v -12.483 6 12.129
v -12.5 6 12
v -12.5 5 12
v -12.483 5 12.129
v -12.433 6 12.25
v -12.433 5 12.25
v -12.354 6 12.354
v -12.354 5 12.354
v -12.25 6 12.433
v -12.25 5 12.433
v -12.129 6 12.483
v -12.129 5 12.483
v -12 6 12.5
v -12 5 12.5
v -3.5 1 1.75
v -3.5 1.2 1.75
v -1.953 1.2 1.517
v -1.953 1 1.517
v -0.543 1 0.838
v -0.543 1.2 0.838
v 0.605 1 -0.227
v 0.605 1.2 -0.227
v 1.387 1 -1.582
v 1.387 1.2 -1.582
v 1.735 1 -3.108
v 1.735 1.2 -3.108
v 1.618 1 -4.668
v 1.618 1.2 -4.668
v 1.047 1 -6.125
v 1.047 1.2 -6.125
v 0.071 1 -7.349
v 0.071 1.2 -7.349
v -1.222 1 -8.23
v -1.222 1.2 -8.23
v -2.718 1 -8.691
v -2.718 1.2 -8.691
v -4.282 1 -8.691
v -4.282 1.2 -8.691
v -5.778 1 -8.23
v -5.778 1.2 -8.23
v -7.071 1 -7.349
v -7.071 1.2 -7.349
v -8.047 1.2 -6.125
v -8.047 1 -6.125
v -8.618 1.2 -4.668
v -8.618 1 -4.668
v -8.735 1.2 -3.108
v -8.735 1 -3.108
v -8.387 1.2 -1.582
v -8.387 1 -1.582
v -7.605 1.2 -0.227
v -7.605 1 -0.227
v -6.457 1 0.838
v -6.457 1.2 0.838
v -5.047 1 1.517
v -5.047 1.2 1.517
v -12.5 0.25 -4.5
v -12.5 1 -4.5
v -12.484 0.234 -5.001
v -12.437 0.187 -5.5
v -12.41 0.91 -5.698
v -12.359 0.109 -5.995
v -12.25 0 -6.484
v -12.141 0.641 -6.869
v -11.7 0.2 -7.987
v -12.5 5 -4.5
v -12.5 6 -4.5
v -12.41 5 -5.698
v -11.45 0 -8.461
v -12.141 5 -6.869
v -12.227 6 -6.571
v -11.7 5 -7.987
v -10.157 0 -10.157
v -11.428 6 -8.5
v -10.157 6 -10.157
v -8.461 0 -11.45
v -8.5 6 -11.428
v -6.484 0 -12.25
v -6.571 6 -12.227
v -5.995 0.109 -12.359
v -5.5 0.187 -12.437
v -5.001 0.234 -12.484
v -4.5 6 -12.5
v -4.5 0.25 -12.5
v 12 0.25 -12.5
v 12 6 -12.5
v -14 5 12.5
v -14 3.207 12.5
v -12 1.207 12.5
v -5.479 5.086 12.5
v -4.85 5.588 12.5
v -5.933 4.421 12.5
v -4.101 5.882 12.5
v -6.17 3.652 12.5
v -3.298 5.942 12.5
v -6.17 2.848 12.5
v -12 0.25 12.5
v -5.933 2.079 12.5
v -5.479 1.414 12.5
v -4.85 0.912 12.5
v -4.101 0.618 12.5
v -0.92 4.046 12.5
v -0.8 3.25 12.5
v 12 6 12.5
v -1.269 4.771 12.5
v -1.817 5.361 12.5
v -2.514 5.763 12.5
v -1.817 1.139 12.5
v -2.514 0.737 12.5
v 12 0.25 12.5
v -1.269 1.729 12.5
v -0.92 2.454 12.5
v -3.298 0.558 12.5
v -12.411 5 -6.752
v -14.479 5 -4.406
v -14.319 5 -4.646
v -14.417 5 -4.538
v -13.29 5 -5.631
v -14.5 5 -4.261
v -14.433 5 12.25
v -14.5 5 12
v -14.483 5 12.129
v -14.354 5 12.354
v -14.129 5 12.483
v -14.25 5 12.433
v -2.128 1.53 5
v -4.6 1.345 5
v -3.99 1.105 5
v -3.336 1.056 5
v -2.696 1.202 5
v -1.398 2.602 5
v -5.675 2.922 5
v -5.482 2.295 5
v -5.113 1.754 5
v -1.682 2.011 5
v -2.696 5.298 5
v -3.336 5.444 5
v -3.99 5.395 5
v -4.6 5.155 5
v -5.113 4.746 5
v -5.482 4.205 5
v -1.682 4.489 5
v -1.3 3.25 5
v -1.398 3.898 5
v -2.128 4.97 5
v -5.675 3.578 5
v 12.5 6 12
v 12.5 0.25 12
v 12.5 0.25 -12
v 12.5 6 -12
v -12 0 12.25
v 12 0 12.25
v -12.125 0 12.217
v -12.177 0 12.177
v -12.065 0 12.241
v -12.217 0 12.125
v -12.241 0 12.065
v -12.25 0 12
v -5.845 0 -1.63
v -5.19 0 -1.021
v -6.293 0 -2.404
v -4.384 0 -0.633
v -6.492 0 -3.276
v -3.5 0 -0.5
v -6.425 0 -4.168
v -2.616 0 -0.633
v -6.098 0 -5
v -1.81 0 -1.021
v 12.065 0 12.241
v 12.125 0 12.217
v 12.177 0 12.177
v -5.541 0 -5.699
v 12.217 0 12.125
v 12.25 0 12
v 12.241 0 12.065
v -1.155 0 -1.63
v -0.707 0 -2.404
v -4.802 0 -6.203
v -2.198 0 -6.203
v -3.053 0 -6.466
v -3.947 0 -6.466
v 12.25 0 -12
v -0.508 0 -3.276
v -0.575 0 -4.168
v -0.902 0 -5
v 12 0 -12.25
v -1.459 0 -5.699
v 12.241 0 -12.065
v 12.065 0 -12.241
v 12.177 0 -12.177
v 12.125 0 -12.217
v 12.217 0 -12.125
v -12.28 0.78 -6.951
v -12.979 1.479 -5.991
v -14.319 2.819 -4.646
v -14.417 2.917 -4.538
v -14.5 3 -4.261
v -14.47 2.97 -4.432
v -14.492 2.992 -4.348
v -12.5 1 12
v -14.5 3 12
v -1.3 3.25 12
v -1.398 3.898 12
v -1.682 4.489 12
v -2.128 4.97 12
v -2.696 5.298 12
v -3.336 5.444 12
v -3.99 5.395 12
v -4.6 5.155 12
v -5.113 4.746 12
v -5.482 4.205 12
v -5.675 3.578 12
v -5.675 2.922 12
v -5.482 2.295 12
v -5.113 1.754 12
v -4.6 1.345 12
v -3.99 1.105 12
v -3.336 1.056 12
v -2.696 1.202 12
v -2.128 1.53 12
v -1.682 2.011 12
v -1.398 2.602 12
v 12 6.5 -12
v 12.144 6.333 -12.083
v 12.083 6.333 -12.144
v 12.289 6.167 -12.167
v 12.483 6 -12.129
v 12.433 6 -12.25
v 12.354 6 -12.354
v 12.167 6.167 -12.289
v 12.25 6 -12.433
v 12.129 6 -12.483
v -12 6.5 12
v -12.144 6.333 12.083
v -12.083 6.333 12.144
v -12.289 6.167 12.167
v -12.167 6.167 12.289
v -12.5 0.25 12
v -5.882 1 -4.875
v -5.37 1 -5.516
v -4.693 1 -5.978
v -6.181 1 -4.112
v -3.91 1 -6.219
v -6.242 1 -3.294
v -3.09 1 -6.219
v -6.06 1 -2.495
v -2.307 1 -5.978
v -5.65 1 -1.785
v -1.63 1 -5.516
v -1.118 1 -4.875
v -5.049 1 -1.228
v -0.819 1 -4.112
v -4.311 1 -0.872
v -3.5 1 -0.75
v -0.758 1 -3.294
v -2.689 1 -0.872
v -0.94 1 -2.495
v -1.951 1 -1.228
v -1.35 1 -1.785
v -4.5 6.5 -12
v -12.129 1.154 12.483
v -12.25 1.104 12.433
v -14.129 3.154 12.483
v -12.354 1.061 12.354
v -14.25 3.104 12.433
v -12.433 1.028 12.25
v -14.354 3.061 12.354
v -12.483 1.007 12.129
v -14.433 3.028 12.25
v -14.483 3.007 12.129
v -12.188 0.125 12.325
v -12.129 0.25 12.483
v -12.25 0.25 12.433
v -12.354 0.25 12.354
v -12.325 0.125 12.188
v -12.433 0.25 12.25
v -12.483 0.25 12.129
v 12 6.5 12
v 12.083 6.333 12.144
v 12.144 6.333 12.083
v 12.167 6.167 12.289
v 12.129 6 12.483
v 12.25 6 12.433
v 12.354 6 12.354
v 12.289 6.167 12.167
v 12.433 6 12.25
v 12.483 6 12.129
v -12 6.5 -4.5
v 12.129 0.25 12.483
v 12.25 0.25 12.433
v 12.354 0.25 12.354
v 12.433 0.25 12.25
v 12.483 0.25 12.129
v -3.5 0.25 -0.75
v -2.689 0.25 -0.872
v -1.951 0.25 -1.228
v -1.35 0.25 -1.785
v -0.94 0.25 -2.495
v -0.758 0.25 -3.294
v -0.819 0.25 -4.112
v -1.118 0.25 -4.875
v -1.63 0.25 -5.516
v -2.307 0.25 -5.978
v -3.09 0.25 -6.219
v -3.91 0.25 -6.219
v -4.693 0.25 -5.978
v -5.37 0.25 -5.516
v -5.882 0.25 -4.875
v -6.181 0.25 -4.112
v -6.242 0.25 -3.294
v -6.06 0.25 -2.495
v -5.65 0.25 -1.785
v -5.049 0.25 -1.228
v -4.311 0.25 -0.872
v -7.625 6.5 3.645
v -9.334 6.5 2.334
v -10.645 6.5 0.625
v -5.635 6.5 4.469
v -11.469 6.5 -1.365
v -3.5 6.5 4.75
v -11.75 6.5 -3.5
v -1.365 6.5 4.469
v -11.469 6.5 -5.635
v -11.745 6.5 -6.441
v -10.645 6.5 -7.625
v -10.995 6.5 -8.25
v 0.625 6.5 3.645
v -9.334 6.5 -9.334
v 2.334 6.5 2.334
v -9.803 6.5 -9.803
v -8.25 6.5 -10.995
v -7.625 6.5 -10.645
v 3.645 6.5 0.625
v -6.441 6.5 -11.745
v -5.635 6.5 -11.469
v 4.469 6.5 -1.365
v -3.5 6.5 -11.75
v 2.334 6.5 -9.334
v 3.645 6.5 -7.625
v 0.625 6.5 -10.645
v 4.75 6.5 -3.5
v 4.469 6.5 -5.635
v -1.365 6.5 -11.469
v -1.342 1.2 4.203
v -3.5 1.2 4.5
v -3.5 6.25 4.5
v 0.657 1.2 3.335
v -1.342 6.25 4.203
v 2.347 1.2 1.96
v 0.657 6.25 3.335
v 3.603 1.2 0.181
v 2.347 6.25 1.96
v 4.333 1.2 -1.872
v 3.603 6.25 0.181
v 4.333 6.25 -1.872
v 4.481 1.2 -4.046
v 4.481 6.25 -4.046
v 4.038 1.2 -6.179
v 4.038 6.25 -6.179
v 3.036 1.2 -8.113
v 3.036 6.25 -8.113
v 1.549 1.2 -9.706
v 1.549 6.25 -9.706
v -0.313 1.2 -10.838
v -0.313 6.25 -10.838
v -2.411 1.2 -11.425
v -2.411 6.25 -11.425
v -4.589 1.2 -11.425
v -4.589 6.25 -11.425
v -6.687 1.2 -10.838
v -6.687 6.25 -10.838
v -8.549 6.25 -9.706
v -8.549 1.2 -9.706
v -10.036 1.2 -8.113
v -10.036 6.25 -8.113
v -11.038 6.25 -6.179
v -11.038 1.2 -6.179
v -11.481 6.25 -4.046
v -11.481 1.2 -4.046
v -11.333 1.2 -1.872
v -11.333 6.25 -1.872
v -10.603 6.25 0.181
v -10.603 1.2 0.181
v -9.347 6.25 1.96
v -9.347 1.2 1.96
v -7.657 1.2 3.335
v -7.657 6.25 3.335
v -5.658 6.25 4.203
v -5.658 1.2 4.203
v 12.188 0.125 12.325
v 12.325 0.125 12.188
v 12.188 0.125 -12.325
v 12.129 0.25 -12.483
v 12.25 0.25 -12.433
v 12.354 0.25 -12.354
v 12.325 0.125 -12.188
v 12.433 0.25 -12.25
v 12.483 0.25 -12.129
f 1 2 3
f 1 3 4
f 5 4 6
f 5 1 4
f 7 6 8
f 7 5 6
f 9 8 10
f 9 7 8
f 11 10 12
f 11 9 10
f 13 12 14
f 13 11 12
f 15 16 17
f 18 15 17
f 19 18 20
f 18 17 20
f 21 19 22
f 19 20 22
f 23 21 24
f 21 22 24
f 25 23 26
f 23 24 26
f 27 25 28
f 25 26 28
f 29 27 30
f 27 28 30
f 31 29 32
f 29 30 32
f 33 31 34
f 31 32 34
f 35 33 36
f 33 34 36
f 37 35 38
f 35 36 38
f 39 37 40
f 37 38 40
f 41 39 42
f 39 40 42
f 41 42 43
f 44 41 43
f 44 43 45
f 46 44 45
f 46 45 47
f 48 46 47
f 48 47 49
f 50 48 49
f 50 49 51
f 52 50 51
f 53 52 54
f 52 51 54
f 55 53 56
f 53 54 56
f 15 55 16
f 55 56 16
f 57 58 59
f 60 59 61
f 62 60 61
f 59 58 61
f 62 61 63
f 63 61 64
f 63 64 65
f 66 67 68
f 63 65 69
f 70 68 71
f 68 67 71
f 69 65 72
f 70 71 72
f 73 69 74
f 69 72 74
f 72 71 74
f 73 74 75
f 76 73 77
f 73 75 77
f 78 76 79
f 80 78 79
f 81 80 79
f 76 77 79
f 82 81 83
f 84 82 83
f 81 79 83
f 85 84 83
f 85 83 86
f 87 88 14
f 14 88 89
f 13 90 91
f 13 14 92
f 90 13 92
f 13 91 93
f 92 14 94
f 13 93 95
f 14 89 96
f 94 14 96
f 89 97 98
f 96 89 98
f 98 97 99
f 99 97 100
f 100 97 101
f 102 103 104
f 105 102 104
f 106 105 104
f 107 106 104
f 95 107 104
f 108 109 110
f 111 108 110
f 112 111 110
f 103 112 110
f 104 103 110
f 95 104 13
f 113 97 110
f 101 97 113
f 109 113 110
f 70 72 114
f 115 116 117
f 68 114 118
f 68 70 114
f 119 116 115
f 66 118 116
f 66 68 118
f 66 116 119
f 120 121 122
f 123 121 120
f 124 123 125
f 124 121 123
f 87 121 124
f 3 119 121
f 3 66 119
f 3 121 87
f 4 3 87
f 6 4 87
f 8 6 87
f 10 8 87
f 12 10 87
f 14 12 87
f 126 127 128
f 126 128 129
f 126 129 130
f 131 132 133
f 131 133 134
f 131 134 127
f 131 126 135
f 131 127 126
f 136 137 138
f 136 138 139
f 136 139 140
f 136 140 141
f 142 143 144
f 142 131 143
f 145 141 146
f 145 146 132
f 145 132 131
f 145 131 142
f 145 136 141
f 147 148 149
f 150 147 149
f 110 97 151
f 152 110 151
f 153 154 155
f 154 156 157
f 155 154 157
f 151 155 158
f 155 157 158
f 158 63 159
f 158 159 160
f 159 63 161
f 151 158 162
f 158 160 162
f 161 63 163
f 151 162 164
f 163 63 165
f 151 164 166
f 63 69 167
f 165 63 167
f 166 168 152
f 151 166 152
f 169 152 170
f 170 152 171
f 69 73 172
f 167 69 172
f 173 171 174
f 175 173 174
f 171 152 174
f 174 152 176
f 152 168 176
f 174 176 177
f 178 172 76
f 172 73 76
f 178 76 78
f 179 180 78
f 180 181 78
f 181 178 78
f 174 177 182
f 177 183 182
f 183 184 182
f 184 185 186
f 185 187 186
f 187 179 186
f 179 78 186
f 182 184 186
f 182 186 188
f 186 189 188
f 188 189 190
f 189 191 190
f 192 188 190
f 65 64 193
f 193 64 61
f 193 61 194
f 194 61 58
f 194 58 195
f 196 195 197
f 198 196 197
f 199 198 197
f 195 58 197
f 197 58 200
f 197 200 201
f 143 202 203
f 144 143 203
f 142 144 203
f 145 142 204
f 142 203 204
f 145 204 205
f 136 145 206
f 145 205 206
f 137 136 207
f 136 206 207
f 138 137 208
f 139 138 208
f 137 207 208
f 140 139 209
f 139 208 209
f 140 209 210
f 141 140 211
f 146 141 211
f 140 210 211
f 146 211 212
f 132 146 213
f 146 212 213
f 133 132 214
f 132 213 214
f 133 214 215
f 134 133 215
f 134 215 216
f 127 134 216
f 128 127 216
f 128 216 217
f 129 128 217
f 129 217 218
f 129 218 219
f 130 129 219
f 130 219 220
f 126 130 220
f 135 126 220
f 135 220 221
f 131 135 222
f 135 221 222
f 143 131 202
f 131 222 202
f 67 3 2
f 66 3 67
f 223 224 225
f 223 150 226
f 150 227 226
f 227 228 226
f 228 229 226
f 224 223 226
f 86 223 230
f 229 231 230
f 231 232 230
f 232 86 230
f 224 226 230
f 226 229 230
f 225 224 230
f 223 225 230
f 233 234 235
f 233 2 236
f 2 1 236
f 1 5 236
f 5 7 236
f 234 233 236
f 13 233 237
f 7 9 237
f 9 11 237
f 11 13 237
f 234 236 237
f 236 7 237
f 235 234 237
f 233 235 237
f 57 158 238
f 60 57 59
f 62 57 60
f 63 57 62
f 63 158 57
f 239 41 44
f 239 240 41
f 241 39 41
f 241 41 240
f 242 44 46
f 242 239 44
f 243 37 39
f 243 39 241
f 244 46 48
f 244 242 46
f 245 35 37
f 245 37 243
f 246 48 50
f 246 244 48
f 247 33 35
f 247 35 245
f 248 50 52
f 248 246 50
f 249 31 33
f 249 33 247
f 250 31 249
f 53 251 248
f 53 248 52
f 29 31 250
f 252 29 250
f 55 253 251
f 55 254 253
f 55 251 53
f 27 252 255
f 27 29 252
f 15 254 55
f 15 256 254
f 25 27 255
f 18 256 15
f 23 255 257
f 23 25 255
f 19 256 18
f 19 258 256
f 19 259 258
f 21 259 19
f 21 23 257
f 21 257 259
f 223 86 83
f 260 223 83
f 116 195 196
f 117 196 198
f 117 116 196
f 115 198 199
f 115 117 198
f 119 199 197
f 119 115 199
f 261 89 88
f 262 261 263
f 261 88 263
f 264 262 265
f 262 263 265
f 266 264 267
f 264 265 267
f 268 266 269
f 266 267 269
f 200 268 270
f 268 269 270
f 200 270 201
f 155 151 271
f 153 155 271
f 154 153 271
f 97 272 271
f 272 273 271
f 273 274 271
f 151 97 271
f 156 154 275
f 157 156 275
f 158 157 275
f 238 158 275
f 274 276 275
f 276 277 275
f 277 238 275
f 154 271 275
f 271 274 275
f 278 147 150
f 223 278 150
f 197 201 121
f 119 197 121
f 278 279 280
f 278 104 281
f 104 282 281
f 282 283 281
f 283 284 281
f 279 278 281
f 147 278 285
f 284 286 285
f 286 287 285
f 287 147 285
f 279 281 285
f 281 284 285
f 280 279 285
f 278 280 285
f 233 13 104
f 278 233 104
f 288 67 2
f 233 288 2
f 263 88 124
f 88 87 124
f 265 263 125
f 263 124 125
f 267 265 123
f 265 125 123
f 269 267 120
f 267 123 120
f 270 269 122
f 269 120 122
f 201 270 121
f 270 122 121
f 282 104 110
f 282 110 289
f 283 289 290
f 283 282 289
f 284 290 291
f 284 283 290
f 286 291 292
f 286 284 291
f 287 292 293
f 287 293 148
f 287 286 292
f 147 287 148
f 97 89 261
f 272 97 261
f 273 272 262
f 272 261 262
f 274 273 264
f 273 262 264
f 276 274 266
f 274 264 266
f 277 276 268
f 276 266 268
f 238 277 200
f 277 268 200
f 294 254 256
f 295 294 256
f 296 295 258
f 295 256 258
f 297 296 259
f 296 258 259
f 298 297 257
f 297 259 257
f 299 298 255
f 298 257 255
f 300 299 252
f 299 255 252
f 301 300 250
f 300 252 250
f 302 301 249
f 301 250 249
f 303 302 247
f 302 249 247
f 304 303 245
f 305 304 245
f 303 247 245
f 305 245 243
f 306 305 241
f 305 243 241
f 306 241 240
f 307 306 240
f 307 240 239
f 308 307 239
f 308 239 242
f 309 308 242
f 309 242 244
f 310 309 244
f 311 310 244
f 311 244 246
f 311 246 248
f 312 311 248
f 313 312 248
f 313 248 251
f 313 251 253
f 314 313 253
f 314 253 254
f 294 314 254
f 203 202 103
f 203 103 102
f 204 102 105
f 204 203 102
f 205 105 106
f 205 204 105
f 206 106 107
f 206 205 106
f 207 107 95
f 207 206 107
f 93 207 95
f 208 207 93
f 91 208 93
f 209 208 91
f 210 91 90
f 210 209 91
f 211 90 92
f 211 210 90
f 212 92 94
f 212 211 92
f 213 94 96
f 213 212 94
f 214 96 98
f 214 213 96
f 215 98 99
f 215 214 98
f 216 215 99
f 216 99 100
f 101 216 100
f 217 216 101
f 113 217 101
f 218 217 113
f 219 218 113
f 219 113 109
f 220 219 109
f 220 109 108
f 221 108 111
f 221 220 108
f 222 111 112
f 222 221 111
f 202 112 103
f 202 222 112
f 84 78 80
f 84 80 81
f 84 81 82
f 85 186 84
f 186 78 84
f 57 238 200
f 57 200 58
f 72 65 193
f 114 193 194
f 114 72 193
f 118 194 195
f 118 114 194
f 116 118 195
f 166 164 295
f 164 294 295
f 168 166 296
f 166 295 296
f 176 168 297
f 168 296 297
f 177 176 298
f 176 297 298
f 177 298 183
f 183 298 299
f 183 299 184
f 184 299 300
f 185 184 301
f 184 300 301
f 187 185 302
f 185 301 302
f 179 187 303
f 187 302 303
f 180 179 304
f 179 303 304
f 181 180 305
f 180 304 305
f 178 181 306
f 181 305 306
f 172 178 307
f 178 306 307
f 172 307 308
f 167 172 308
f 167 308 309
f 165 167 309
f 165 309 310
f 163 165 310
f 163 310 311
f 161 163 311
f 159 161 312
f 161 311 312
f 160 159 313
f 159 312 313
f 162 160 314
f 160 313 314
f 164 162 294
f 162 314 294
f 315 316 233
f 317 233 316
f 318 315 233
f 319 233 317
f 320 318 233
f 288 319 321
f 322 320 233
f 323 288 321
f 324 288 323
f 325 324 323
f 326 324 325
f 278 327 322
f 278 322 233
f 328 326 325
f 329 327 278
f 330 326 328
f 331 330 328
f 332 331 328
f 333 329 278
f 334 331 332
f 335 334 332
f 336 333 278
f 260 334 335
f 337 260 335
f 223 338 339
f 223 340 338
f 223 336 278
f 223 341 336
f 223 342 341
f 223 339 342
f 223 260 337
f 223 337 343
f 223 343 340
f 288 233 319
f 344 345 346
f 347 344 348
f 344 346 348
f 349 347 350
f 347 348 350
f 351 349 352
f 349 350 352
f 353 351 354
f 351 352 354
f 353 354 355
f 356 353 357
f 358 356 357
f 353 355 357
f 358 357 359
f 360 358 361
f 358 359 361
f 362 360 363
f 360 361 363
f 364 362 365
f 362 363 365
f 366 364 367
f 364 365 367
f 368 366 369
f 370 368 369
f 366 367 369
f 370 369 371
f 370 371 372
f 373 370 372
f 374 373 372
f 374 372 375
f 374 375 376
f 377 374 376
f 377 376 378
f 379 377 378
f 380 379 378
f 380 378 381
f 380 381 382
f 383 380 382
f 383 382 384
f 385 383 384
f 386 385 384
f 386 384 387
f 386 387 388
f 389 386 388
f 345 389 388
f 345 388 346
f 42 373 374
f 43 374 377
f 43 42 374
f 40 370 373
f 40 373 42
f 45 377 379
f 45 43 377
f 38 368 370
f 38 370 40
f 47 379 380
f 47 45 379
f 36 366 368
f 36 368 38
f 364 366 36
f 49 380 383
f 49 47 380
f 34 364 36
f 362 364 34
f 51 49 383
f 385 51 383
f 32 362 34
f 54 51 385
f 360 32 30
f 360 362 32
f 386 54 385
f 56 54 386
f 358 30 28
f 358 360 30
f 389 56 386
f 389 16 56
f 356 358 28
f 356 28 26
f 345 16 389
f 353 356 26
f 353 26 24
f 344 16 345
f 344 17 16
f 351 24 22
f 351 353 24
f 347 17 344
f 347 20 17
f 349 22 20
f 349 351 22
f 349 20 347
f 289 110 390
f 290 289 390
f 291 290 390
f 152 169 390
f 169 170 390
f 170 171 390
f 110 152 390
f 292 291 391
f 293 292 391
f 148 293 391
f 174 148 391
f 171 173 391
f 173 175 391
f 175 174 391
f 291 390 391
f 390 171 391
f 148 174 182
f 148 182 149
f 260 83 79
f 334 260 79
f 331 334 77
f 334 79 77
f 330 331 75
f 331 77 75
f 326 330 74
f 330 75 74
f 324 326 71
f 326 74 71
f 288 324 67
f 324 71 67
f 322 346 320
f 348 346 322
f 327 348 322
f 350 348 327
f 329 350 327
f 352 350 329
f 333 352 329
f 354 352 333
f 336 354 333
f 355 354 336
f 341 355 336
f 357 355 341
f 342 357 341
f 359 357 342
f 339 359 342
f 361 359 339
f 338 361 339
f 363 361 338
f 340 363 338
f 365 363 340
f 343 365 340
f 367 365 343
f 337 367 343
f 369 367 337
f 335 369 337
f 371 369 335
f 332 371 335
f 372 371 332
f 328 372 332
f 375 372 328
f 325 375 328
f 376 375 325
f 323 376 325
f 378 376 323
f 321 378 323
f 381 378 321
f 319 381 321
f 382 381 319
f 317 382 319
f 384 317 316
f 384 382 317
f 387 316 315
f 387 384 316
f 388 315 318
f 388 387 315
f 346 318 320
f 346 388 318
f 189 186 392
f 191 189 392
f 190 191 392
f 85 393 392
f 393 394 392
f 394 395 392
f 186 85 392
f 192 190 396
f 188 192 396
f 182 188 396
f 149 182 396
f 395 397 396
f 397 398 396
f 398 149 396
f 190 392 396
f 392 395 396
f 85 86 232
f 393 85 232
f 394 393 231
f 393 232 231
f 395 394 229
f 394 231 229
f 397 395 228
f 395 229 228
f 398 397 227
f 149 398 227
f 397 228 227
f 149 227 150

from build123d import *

# Parameters (mm, degrees)
SKETCH1_W           = 25
SKETCH1_H           = 25
BOSS_EXTRUDE1_DEPTH = 6.5
SKETCH2_R           = 8
CUT_EXTRUDE1_DEPTH  = 5.5
FILLET1_R           = 8
SKETCH4_R           = 2.2
CUT_EXTRUDE2_DEPTH  = 7.5
BOSS_EXTRUDE2_DEPTH = 17
FILLET2_R           = 10
SKETCH6_R           = 2.75
CUT_EXTRUDE3_DEPTH  = 20.918584287
BOSS_EXTRUDE3_START = 0.2
SKETCH7_R           = 8
SKETCH7_R_2         = 5.25
BOSS_EXTRUDE3_DEPTH = 0.2
FILLET3_R           = 0.5
CHAMFER1_SIZE       = 0.5
CHAMFER7_SIZE       = 0.25


# Some blends are built 0.0001 mm under size
with BuildPart() as part:
    # Sketch1 → Boss-Extrude1 (new body)
    with BuildSketch(Plane(origin=(0, 0, 0), x_dir=(1, 0, 0), z_dir=(0, 1, 0))):
        Rectangle(SKETCH1_W, SKETCH1_H)
    extrude(amount=BOSS_EXTRUDE1_DEPTH)

    # Sketch2 → Cut-Extrude1 (cut)
    with BuildSketch(Plane(origin=(0, 6.5, 0), x_dir=(1, 0, 0), z_dir=(0, 1, 0))):
        with Locations(Location((-3.5, 3.5, 0), (0, 0, 270))):
            Circle(SKETCH2_R)
    extrude(amount=-CUT_EXTRUDE1_DEPTH, mode=Mode.SUBTRACT)

    # Fillet1
    fillet1_edges = [part.edges().sort_by_distance(p)[0] for p in [
        (-12.5, 3.25, -12.5),
    ]]
    fillet(fillet1_edges, radius=FILLET1_R)

    # Sketch4 → Cut-Extrude2 (cut)
    with BuildSketch(Plane.XY.offset(12.5)):
        with Locations((-3.5, 3.25)):
            Circle(SKETCH4_R)
    extrude(amount=-CUT_EXTRUDE2_DEPTH, mode=Mode.SUBTRACT)

    # Sketch5 → Boss-Extrude2 (add)
    with BuildSketch(Plane.XY.offset(12.5)):
        Polygon((-12.5, 1), (-14.5, 3), (-14.5, 5), (-12.5, 5), align=None)
    extrude(amount=-BOSS_EXTRUDE2_DEPTH)

    # Fillet2
    # the kernel refuses this fillet: 10 mm, written as the material it adds along each edge
    with BuildSketch(Plane(origin=(-12.5, 5, -4.5), x_dir=(0.22360679774997813, 0, -0.9746794344808967), z_dir=(0, -1, 0))) as fillet2_piece_1_section:
        with BuildLine():
            CenterArc((5.813776741, -9.746794345), FILLET2_R, 102.920966382, 25.841932763)
            Line((-0.447213595, -1.949358869), (-0.572433402, -1.793410159))
            ThreePointArc((-0.572433402, -1.793410159), (-0.418542685, -0.929958075), (-0.194935887, 0.04472136))
            Line((-0.194935887, 0.04472136), (0.04472136, 0.194935887))
            ThreePointArc((0.04472136, 0.194935887), (1.788854382, -0.002564524), (3.532987404, 0.194935887))
            Line((3.532987404, 0.194935887), (3.577708764, 0))
        make_face()
    fillet2_piece_1 = extrude(amount=12.94427191, mode=Mode.PRIVATE)
    fillet2_piece_1 = split(fillet2_piece_1, bisect_by=Plane(origin=(-14.5, 3, -4.5), z_dir=(0.7071067811865512, 0.7071067811865438, 0)), keep=Keep.TOP, mode=Mode.PRIVATE)
    add(fillet2_piece_1)

    # Sketch6 → Cut-Extrude3 (cut, through all)
    with BuildSketch(Plane(origin=(0, 1, 0), x_dir=(1, 0, 0), z_dir=(0, 1, 0))):
        with Locations(Location((-3.5, 3.5, 0), (0, 0, 270))):
            Circle(SKETCH6_R)
    extrude(amount=-CUT_EXTRUDE3_DEPTH, mode=Mode.SUBTRACT)

    # Sketch7 → Boss-Extrude3 (add)
    with BuildSketch(Plane(origin=(0, 1, 0), x_dir=(1, 0, 0), z_dir=(0, 1, 0)).offset(BOSS_EXTRUDE3_START)):
        with Locations(Location((-3.5, 3.5, 0), (0, 0, 270))):
            Circle(SKETCH7_R)
        with Locations(Location((-3.5, 3.5, 0), (0, 0, 270))):
            Circle(SKETCH7_R_2, mode=Mode.SUBTRACT)
    extrude(amount=-BOSS_EXTRUDE3_DEPTH)

    # Fillet3
    fillet3_edges = [part.edges().sort_by_distance(p)[0] for p in [
        (-14.5, 4, -4.5),
        (-12.5, 0.5, 12.5),
        (-13.5, 2, 12.5),
        (-14.5, 4, 12.5),
        (-12.5, 5.75, 12.5),
        (12.5, 3.25, -12.5),
        (12.5, 3.25, 12.5),
    ]]
    fillet(fillet3_edges, radius=FILLET3_R)

    # Chamfer1
    chamfer1_edges = [part.edges().sort_by_distance(p)[0] for p in [
        (0, 6.5, 12.5),
        (3.75, 6.5, -12.5),
        (12.5, 6.5, 0),
        (12.353553391, 6.5, 12.353553391),
        (12.353553391, 6.5, -12.353553391),
        (-12.353553391, 6.5, 12.353553391),
        (-12.5, 6.5, 3.75),
        (-10.156854249, 6.5, -10.156854249),
        (-5.7, 3.25, 12.5),
    ]]
    chamfer(chamfer1_edges, length=CHAMFER1_SIZE - 0.0001)  # a hair under: the kernel refuses the full size

    # Chamfer7
    # the kernel refuses this chamfer: 0.25 mm, written as the material it takes off along each edge
    with BuildSketch(Plane(origin=(-3.5, 0, -3.5), x_dir=(0, 0, 1), z_dir=(-1, 0, 0))) as chamfer7_piece_1:
        Polygon((2.75 + CHAMFER7_SIZE, 0), (2.75, CHAMFER7_SIZE), (2.75, 0), align=None)
    revolve(axis=Axis((-3.5, 0, -3.5), (0, 1, 0)), mode=Mode.SUBTRACT)
    with BuildSketch(Plane(origin=(-12.5, 0, -7.714603735), x_dir=(1, 0, 0), z_dir=(0, 0, 1)), Plane(origin=(12, 0, -12.5), x_dir=(0, 0, 1), z_dir=(-1, 0, 0))) as chamfer7_piece_2:
        Polygon((CHAMFER7_SIZE, 0), (0, CHAMFER7_SIZE), (0, 0), align=None)
    extrude(amount=19.714603735, mode=Mode.SUBTRACT)
    with BuildSketch(Plane(origin=(-12, 0, 12.5), x_dir=(0, 1, 0), z_dir=(1, 0, 0))) as chamfer7_piece_3:
        Polygon((CHAMFER7_SIZE, 0), (0, -CHAMFER7_SIZE), (0, 0), align=None)
    extrude(amount=24, mode=Mode.SUBTRACT)
    with BuildSketch(Plane(origin=(12.5, 0, 12), x_dir=(-1, 0, 0), z_dir=(0, 0, -1))) as chamfer7_piece_4:
        Polygon((CHAMFER7_SIZE, 0), (0, CHAMFER7_SIZE), (0, 0), align=None)
    extrude(amount=24, mode=Mode.SUBTRACT)
    with BuildSketch(Plane(origin=(-3.5, 6.5, -3.5), x_dir=(0, 0, 1), z_dir=(-1, 0, 0))) as chamfer7_piece_5:
        Polygon((8 + CHAMFER7_SIZE, 0), (8, -CHAMFER7_SIZE), (8, 0), align=None)
    revolve(axis=Axis((-3.5, 6.5, -3.5), (0, 1, 0)), mode=Mode.SUBTRACT)
    with BuildSketch(Plane(origin=(12, 0, -12), x_dir=(0, 0, -1), z_dir=(-1, 0, 0))) as chamfer7_piece_6:
        Polygon((0.5 - CHAMFER7_SIZE, 0), (0.5, -CHAMFER7_SIZE), (0.5, 0), align=None)
    revolve(axis=Axis((12, 0, -12), (0, -1, 0)), revolution_arc=90, mode=Mode.SUBTRACT)
    with BuildSketch(Plane(origin=(12, 0, 12), x_dir=(0, 0, 1), z_dir=(-1, 0, 0))) as chamfer7_piece_7:
        Polygon((0.5, CHAMFER7_SIZE), (0.5 - CHAMFER7_SIZE, 0), (0.5, 0), align=None)
    revolve(axis=Axis((12, 0, 12), (0, 1, 0)), revolution_arc=90, mode=Mode.SUBTRACT)
    with BuildSketch(Plane(origin=(-12, 0, 12), x_dir=(0, 0, 1), z_dir=(1, 0, 0))) as chamfer7_piece_8:
        Polygon((0.5 - CHAMFER7_SIZE, 0), (0.5, -CHAMFER7_SIZE), (0.5, 0), align=None)
    revolve(axis=Axis((-12, 0, 12), (0, -1, 0)), revolution_arc=90, mode=Mode.SUBTRACT)


solid = part.part
